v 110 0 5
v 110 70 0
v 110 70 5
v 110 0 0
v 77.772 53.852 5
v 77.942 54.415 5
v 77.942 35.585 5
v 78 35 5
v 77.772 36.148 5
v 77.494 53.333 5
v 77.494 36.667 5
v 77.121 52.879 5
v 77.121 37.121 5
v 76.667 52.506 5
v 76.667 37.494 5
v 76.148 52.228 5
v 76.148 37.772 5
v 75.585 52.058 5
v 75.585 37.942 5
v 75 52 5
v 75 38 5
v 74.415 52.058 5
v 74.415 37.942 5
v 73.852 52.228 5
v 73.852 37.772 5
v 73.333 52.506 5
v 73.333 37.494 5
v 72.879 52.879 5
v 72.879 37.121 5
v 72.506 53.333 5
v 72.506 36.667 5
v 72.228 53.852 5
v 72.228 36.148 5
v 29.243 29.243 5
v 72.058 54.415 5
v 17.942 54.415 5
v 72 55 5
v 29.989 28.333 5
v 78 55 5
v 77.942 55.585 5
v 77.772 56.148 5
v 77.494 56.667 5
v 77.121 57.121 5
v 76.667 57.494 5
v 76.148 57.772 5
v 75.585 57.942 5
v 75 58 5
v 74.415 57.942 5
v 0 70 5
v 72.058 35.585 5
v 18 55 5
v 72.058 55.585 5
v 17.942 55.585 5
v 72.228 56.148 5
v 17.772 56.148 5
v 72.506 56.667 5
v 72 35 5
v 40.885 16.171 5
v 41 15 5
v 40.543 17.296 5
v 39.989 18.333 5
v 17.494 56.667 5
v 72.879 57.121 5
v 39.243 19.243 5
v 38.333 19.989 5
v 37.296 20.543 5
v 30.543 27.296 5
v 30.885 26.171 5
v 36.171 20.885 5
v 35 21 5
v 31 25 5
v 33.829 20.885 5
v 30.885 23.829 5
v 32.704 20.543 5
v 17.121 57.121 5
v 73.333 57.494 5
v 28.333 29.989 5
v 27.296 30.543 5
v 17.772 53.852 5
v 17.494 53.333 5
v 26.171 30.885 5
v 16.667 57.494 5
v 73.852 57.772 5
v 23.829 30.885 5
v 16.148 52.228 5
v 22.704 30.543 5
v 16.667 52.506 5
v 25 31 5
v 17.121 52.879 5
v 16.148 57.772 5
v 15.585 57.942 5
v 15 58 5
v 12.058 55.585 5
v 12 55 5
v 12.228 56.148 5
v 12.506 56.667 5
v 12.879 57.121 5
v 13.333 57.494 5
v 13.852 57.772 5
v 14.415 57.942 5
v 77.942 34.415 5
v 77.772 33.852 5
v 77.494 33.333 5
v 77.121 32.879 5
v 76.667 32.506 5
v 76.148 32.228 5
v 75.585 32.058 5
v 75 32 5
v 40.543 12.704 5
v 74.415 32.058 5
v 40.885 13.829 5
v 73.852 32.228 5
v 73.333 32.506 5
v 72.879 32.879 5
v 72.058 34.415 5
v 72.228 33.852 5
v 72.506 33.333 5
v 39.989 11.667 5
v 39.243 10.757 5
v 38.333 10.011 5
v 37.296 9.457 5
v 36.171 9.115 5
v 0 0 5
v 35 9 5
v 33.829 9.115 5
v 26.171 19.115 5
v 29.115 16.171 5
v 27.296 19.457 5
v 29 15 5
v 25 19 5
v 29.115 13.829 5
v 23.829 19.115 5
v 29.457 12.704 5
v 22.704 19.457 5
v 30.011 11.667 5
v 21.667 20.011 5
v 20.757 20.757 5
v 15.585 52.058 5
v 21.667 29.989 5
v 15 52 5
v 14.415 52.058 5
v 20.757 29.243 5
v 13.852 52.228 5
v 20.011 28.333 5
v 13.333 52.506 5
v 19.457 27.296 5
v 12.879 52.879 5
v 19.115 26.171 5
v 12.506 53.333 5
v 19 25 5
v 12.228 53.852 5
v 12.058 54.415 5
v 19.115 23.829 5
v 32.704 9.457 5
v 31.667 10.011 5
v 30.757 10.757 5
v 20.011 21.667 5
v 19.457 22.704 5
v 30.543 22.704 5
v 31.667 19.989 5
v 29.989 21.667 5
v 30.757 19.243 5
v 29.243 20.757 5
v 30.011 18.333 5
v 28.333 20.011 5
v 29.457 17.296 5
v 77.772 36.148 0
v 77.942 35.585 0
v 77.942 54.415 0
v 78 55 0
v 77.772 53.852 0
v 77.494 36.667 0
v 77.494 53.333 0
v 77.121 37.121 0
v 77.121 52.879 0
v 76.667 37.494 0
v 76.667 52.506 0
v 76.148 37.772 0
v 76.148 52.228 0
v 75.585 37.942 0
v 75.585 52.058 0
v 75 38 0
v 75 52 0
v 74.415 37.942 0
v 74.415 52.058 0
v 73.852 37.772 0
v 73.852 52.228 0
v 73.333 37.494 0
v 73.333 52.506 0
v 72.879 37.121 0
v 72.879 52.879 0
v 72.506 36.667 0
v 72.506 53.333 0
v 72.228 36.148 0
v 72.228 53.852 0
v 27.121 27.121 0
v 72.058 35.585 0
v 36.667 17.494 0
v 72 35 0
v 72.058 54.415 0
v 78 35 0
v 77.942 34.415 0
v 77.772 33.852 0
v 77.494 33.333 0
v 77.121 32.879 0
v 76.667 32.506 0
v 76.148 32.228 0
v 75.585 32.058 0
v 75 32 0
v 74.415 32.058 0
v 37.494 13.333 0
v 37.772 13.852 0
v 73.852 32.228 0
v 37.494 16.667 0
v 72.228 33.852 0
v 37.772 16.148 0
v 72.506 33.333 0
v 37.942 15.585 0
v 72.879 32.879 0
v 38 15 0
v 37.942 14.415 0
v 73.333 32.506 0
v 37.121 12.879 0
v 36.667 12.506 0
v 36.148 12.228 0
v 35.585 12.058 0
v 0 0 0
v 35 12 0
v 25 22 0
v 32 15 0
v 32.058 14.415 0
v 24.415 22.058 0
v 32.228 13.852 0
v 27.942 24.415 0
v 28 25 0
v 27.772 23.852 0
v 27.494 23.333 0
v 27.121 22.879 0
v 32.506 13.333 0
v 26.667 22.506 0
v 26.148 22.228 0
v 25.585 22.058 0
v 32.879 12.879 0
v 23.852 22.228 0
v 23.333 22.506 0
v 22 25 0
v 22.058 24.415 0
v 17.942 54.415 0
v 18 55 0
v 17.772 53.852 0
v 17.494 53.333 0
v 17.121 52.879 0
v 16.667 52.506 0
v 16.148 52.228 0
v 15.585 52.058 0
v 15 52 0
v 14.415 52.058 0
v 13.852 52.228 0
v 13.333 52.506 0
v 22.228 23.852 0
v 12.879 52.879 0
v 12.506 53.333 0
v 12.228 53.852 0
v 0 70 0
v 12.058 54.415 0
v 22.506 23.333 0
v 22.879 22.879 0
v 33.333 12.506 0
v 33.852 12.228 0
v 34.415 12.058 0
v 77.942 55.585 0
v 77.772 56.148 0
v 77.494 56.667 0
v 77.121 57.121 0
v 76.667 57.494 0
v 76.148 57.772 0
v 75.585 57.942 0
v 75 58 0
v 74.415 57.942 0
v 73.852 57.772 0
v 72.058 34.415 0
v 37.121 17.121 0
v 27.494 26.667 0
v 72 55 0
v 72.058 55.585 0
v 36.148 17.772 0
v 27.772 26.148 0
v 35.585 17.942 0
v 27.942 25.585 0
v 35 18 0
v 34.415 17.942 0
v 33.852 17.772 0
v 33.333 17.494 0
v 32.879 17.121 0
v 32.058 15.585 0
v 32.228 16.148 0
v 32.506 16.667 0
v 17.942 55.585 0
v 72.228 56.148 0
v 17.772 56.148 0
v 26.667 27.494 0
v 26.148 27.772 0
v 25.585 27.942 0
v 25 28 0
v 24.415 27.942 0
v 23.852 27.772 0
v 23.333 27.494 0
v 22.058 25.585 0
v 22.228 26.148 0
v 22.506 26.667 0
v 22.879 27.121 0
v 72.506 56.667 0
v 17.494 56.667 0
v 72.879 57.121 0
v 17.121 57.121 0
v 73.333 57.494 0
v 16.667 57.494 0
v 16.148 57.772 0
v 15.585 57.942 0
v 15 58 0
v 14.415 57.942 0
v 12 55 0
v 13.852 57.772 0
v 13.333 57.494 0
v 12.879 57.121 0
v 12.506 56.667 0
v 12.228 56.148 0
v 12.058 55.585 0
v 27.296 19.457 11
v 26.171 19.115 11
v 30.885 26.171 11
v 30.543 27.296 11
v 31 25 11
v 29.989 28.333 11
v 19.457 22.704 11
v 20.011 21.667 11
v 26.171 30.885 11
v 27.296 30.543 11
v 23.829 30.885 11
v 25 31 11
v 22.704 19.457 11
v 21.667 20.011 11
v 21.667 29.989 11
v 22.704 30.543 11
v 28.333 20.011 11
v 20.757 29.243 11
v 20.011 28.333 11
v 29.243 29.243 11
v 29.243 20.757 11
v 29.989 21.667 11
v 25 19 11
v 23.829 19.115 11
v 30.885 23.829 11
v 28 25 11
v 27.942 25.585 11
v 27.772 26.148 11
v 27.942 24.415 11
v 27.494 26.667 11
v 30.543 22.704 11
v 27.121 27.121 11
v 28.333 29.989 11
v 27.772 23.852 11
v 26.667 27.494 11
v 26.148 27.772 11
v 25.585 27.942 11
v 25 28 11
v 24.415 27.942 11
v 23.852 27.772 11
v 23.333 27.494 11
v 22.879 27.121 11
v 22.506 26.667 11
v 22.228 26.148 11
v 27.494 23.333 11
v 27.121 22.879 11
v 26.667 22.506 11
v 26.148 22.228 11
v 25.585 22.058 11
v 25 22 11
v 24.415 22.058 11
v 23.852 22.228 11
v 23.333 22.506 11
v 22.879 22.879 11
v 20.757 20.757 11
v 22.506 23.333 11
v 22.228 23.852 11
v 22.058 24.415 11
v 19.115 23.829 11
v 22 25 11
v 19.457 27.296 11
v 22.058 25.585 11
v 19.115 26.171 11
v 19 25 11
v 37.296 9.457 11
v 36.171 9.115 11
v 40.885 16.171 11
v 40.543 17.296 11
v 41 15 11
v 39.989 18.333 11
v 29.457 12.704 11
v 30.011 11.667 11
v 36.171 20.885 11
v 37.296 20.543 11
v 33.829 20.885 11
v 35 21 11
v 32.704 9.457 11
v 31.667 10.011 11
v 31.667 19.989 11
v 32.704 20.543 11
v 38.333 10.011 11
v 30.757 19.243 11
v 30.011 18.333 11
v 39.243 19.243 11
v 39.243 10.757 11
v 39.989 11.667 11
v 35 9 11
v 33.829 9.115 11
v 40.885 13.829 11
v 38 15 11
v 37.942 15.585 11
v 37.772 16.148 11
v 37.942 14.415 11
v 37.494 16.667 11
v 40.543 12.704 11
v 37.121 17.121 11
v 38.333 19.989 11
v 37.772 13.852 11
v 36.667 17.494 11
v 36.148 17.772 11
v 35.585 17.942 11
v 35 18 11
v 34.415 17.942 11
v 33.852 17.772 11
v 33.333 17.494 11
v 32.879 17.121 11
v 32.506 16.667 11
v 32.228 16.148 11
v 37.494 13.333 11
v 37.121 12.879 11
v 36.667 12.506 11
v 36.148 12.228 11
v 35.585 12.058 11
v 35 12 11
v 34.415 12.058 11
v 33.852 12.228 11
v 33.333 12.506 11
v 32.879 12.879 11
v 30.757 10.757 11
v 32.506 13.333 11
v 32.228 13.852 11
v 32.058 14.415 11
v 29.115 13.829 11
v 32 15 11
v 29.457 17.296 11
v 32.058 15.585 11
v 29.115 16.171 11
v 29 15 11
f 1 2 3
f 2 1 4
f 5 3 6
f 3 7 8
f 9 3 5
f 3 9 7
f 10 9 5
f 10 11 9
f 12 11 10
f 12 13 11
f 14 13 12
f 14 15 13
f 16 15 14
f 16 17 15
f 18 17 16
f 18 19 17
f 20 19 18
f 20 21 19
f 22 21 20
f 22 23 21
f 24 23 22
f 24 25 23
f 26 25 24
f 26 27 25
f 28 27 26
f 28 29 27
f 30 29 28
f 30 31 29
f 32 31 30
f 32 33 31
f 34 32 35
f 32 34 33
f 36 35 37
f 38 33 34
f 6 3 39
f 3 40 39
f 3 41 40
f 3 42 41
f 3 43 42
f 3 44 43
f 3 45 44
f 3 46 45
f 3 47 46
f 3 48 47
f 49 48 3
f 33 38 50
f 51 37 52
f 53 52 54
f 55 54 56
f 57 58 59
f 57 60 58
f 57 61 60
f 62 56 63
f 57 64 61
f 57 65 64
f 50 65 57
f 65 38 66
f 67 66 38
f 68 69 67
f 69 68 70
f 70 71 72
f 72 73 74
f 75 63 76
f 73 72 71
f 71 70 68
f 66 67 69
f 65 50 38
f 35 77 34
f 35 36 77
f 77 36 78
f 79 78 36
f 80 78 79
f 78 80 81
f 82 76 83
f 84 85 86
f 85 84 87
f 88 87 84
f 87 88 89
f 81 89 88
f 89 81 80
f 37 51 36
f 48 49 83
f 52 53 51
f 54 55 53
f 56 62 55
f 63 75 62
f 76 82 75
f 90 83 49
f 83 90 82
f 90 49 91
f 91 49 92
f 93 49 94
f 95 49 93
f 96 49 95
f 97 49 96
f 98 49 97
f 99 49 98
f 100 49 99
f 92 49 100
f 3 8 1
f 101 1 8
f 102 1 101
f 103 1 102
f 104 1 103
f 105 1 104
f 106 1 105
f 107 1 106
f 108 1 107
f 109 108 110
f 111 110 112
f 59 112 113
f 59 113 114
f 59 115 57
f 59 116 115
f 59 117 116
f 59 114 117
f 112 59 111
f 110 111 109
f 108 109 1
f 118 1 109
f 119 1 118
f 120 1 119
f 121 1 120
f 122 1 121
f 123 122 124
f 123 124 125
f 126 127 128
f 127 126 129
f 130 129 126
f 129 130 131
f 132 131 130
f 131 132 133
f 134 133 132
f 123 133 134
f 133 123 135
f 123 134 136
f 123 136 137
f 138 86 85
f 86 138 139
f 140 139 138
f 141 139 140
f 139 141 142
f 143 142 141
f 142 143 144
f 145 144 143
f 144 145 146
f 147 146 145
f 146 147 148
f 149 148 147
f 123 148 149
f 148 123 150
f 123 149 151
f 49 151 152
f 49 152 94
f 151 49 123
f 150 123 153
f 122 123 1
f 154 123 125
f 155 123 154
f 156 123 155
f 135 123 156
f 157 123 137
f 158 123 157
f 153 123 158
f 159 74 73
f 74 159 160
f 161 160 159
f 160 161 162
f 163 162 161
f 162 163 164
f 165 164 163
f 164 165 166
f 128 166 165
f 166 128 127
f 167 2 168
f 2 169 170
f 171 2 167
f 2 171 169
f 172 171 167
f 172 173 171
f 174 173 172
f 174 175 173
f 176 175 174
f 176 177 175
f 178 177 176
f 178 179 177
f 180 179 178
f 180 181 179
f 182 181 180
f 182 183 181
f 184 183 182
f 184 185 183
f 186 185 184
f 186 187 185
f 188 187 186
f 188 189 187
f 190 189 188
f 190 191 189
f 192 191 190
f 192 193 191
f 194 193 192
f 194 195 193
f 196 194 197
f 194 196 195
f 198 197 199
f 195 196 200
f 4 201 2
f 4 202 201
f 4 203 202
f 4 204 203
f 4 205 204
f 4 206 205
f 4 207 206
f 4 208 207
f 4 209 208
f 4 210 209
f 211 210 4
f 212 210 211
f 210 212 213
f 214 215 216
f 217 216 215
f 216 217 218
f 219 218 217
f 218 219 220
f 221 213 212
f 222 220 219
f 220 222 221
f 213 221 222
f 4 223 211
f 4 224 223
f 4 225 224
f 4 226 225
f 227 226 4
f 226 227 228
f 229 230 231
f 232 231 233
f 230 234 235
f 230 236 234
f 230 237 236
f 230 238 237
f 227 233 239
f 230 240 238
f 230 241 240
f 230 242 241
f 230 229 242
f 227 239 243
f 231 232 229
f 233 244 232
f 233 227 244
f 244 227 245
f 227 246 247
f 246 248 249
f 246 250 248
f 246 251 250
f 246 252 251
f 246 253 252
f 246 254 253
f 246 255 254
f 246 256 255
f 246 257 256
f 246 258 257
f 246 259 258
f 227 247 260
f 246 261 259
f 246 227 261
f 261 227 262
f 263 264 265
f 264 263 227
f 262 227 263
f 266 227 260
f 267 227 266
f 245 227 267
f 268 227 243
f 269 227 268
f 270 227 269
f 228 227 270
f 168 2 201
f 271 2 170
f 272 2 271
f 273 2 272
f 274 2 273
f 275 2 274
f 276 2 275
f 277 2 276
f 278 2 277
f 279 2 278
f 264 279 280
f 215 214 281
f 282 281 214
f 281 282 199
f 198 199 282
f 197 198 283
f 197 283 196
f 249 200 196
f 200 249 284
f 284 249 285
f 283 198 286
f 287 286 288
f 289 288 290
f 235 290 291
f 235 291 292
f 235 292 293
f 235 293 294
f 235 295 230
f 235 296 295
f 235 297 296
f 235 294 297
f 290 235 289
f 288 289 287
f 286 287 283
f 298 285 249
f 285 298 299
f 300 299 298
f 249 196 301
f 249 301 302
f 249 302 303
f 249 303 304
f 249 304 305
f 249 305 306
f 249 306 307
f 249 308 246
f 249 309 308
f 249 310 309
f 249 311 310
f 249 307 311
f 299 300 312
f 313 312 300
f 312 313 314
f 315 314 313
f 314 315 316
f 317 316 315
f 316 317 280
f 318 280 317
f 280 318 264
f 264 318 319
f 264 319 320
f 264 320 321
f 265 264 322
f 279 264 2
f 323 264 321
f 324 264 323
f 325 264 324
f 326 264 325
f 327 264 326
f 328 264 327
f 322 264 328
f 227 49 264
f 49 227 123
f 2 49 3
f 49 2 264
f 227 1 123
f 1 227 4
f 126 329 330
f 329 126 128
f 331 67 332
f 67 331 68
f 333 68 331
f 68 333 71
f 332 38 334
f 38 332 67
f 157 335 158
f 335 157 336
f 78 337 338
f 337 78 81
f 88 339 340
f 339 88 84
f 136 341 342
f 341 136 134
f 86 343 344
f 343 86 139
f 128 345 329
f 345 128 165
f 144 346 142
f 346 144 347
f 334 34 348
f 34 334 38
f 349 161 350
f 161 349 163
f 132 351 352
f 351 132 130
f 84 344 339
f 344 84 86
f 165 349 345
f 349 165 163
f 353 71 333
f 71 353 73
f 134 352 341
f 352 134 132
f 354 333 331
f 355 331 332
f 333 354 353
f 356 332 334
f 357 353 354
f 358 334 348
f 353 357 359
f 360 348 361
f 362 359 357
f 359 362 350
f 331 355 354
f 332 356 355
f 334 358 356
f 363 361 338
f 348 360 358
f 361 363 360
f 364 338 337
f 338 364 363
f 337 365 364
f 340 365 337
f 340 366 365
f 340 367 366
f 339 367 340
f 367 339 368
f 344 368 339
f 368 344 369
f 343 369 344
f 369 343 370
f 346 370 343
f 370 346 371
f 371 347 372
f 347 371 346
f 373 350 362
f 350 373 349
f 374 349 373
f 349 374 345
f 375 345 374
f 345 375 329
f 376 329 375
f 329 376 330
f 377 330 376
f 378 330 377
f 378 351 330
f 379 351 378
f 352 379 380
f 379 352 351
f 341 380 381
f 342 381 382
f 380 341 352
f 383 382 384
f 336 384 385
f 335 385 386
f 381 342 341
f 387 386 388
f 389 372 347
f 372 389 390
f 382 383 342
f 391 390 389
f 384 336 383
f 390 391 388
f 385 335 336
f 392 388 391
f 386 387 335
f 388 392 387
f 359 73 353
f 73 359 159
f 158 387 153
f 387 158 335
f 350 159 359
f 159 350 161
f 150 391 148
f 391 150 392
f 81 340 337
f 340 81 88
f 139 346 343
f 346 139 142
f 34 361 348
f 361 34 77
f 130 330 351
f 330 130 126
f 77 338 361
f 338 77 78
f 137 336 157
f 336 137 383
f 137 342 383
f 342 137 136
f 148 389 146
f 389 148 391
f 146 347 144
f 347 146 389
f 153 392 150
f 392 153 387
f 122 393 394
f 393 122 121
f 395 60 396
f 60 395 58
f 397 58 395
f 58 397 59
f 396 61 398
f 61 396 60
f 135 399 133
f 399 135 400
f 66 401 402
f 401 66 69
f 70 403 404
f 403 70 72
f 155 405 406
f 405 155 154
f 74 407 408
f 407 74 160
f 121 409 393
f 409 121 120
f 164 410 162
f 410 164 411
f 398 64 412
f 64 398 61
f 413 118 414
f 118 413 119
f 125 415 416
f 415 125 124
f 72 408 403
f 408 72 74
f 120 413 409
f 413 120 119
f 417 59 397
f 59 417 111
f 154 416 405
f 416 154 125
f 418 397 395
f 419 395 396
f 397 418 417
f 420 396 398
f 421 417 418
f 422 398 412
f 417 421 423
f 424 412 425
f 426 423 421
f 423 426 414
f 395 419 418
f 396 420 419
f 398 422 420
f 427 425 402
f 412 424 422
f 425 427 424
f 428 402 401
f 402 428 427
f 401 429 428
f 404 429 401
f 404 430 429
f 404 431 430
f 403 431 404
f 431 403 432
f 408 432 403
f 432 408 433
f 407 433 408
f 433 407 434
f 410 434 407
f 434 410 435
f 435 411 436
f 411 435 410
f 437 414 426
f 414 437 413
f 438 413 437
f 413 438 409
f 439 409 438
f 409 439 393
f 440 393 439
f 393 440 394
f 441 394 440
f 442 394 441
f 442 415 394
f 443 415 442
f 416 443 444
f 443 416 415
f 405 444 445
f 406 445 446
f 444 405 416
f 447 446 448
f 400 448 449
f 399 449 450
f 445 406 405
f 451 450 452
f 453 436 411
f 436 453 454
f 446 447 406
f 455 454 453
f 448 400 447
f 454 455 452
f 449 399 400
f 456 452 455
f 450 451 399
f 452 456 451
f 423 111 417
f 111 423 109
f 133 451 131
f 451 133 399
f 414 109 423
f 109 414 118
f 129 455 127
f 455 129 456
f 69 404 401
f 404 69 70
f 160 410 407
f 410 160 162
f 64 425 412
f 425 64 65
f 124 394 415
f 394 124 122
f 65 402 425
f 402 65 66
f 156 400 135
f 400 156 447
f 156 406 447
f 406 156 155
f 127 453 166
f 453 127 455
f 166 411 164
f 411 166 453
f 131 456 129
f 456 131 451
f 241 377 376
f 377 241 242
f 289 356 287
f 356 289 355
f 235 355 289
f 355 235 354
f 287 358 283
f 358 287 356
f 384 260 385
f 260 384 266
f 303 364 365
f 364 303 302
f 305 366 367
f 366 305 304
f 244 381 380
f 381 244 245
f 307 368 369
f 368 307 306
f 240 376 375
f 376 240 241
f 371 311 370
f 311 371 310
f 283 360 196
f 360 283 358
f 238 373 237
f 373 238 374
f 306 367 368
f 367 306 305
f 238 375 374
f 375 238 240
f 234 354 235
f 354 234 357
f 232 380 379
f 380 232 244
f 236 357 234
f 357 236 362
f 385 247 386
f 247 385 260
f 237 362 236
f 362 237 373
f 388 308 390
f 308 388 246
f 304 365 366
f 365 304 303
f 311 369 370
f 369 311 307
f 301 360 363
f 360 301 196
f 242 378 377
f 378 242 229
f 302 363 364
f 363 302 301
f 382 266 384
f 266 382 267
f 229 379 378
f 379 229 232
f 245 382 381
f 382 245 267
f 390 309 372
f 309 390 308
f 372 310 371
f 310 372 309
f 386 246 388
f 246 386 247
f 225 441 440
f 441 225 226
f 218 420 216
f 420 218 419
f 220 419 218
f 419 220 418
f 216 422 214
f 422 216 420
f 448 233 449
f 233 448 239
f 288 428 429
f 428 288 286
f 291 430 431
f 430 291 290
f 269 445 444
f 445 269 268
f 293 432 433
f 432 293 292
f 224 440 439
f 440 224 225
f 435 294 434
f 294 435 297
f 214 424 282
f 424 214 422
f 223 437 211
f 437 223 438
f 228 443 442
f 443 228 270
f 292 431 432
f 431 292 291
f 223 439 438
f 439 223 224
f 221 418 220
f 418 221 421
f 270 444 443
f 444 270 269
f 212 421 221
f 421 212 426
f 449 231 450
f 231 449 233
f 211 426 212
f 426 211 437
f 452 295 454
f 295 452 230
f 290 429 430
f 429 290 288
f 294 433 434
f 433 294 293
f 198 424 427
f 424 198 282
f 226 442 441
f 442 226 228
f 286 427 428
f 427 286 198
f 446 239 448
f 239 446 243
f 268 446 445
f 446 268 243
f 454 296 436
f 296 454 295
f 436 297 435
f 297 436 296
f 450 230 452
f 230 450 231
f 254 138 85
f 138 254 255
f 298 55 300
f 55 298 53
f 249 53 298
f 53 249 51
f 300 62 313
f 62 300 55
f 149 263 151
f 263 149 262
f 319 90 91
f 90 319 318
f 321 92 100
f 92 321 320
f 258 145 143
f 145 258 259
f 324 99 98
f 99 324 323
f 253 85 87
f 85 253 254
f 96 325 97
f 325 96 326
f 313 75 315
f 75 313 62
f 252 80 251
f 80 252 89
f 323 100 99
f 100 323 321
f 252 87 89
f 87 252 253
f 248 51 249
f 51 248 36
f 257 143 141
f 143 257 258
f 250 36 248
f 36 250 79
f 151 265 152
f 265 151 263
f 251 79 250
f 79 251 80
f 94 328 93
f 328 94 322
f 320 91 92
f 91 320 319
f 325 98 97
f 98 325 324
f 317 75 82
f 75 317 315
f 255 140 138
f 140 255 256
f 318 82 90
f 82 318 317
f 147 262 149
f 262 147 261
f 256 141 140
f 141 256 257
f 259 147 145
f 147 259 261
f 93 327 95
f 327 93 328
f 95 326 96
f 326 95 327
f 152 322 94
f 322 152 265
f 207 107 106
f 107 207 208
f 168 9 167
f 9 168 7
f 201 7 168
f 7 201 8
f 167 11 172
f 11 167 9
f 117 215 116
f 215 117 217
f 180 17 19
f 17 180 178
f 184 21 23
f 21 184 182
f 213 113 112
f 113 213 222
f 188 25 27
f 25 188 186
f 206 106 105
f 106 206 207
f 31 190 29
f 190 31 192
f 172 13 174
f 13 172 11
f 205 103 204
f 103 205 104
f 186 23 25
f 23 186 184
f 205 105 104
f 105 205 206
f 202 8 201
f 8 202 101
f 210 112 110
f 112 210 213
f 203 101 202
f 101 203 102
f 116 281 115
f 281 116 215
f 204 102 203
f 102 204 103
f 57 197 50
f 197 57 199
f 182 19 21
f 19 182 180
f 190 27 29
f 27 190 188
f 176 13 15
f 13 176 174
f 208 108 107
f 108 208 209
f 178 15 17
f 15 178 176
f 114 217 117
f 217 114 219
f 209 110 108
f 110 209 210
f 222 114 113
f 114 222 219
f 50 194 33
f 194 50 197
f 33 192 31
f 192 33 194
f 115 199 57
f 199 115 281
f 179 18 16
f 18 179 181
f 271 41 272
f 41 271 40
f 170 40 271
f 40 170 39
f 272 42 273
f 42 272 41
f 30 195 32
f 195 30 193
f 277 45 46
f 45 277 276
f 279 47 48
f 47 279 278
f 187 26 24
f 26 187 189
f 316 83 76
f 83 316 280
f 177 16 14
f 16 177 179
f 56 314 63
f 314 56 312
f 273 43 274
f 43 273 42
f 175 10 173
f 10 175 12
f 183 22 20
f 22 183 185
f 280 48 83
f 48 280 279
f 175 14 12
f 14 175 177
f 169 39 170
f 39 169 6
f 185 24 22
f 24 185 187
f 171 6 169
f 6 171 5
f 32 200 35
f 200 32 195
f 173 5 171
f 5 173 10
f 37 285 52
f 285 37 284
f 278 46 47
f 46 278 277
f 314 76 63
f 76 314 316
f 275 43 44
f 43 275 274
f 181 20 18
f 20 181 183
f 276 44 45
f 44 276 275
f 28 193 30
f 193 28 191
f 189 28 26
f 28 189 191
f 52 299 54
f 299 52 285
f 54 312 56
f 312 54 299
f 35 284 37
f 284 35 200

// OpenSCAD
$fn = 32;

// ----------------------------------------------------------------------
// Mixed field: bosses and holes at given coordinates
// ----------------------------------------------------------------------

// --- parameters (mm) ---
plate_l = 110;            // plate length, X
plate_w = 70;             // plate width, Y
plate_t = 5;              // plate thickness, Z
boss_d = 12;              // boss diameter
boss_h = 6;               // boss height above the plate
hole_d = 6;               // through hole diameter

total_h = plate_t + boss_h;  // overall height

difference() {
  union() {
    cube([plate_l, plate_w, plate_t]);
    translate([25, 25, plate_t]) cylinder(h = boss_h, d = boss_d);
    translate([35, 15, plate_t]) cylinder(h = boss_h, d = boss_d);
  }
  translate([25, 25, -1]) cylinder(h = total_h + 2, d = boss_d / 2);
  translate([35, 15, -1]) cylinder(h = total_h + 2, d = boss_d / 2);
  translate([15, 55, -1]) cylinder(h = plate_t + 2, d = hole_d);
  translate([75, 35, -1]) cylinder(h = plate_t + 2, d = hole_d);
  translate([75, 55, -1]) cylinder(h = plate_t + 2, d = hole_d);
}
